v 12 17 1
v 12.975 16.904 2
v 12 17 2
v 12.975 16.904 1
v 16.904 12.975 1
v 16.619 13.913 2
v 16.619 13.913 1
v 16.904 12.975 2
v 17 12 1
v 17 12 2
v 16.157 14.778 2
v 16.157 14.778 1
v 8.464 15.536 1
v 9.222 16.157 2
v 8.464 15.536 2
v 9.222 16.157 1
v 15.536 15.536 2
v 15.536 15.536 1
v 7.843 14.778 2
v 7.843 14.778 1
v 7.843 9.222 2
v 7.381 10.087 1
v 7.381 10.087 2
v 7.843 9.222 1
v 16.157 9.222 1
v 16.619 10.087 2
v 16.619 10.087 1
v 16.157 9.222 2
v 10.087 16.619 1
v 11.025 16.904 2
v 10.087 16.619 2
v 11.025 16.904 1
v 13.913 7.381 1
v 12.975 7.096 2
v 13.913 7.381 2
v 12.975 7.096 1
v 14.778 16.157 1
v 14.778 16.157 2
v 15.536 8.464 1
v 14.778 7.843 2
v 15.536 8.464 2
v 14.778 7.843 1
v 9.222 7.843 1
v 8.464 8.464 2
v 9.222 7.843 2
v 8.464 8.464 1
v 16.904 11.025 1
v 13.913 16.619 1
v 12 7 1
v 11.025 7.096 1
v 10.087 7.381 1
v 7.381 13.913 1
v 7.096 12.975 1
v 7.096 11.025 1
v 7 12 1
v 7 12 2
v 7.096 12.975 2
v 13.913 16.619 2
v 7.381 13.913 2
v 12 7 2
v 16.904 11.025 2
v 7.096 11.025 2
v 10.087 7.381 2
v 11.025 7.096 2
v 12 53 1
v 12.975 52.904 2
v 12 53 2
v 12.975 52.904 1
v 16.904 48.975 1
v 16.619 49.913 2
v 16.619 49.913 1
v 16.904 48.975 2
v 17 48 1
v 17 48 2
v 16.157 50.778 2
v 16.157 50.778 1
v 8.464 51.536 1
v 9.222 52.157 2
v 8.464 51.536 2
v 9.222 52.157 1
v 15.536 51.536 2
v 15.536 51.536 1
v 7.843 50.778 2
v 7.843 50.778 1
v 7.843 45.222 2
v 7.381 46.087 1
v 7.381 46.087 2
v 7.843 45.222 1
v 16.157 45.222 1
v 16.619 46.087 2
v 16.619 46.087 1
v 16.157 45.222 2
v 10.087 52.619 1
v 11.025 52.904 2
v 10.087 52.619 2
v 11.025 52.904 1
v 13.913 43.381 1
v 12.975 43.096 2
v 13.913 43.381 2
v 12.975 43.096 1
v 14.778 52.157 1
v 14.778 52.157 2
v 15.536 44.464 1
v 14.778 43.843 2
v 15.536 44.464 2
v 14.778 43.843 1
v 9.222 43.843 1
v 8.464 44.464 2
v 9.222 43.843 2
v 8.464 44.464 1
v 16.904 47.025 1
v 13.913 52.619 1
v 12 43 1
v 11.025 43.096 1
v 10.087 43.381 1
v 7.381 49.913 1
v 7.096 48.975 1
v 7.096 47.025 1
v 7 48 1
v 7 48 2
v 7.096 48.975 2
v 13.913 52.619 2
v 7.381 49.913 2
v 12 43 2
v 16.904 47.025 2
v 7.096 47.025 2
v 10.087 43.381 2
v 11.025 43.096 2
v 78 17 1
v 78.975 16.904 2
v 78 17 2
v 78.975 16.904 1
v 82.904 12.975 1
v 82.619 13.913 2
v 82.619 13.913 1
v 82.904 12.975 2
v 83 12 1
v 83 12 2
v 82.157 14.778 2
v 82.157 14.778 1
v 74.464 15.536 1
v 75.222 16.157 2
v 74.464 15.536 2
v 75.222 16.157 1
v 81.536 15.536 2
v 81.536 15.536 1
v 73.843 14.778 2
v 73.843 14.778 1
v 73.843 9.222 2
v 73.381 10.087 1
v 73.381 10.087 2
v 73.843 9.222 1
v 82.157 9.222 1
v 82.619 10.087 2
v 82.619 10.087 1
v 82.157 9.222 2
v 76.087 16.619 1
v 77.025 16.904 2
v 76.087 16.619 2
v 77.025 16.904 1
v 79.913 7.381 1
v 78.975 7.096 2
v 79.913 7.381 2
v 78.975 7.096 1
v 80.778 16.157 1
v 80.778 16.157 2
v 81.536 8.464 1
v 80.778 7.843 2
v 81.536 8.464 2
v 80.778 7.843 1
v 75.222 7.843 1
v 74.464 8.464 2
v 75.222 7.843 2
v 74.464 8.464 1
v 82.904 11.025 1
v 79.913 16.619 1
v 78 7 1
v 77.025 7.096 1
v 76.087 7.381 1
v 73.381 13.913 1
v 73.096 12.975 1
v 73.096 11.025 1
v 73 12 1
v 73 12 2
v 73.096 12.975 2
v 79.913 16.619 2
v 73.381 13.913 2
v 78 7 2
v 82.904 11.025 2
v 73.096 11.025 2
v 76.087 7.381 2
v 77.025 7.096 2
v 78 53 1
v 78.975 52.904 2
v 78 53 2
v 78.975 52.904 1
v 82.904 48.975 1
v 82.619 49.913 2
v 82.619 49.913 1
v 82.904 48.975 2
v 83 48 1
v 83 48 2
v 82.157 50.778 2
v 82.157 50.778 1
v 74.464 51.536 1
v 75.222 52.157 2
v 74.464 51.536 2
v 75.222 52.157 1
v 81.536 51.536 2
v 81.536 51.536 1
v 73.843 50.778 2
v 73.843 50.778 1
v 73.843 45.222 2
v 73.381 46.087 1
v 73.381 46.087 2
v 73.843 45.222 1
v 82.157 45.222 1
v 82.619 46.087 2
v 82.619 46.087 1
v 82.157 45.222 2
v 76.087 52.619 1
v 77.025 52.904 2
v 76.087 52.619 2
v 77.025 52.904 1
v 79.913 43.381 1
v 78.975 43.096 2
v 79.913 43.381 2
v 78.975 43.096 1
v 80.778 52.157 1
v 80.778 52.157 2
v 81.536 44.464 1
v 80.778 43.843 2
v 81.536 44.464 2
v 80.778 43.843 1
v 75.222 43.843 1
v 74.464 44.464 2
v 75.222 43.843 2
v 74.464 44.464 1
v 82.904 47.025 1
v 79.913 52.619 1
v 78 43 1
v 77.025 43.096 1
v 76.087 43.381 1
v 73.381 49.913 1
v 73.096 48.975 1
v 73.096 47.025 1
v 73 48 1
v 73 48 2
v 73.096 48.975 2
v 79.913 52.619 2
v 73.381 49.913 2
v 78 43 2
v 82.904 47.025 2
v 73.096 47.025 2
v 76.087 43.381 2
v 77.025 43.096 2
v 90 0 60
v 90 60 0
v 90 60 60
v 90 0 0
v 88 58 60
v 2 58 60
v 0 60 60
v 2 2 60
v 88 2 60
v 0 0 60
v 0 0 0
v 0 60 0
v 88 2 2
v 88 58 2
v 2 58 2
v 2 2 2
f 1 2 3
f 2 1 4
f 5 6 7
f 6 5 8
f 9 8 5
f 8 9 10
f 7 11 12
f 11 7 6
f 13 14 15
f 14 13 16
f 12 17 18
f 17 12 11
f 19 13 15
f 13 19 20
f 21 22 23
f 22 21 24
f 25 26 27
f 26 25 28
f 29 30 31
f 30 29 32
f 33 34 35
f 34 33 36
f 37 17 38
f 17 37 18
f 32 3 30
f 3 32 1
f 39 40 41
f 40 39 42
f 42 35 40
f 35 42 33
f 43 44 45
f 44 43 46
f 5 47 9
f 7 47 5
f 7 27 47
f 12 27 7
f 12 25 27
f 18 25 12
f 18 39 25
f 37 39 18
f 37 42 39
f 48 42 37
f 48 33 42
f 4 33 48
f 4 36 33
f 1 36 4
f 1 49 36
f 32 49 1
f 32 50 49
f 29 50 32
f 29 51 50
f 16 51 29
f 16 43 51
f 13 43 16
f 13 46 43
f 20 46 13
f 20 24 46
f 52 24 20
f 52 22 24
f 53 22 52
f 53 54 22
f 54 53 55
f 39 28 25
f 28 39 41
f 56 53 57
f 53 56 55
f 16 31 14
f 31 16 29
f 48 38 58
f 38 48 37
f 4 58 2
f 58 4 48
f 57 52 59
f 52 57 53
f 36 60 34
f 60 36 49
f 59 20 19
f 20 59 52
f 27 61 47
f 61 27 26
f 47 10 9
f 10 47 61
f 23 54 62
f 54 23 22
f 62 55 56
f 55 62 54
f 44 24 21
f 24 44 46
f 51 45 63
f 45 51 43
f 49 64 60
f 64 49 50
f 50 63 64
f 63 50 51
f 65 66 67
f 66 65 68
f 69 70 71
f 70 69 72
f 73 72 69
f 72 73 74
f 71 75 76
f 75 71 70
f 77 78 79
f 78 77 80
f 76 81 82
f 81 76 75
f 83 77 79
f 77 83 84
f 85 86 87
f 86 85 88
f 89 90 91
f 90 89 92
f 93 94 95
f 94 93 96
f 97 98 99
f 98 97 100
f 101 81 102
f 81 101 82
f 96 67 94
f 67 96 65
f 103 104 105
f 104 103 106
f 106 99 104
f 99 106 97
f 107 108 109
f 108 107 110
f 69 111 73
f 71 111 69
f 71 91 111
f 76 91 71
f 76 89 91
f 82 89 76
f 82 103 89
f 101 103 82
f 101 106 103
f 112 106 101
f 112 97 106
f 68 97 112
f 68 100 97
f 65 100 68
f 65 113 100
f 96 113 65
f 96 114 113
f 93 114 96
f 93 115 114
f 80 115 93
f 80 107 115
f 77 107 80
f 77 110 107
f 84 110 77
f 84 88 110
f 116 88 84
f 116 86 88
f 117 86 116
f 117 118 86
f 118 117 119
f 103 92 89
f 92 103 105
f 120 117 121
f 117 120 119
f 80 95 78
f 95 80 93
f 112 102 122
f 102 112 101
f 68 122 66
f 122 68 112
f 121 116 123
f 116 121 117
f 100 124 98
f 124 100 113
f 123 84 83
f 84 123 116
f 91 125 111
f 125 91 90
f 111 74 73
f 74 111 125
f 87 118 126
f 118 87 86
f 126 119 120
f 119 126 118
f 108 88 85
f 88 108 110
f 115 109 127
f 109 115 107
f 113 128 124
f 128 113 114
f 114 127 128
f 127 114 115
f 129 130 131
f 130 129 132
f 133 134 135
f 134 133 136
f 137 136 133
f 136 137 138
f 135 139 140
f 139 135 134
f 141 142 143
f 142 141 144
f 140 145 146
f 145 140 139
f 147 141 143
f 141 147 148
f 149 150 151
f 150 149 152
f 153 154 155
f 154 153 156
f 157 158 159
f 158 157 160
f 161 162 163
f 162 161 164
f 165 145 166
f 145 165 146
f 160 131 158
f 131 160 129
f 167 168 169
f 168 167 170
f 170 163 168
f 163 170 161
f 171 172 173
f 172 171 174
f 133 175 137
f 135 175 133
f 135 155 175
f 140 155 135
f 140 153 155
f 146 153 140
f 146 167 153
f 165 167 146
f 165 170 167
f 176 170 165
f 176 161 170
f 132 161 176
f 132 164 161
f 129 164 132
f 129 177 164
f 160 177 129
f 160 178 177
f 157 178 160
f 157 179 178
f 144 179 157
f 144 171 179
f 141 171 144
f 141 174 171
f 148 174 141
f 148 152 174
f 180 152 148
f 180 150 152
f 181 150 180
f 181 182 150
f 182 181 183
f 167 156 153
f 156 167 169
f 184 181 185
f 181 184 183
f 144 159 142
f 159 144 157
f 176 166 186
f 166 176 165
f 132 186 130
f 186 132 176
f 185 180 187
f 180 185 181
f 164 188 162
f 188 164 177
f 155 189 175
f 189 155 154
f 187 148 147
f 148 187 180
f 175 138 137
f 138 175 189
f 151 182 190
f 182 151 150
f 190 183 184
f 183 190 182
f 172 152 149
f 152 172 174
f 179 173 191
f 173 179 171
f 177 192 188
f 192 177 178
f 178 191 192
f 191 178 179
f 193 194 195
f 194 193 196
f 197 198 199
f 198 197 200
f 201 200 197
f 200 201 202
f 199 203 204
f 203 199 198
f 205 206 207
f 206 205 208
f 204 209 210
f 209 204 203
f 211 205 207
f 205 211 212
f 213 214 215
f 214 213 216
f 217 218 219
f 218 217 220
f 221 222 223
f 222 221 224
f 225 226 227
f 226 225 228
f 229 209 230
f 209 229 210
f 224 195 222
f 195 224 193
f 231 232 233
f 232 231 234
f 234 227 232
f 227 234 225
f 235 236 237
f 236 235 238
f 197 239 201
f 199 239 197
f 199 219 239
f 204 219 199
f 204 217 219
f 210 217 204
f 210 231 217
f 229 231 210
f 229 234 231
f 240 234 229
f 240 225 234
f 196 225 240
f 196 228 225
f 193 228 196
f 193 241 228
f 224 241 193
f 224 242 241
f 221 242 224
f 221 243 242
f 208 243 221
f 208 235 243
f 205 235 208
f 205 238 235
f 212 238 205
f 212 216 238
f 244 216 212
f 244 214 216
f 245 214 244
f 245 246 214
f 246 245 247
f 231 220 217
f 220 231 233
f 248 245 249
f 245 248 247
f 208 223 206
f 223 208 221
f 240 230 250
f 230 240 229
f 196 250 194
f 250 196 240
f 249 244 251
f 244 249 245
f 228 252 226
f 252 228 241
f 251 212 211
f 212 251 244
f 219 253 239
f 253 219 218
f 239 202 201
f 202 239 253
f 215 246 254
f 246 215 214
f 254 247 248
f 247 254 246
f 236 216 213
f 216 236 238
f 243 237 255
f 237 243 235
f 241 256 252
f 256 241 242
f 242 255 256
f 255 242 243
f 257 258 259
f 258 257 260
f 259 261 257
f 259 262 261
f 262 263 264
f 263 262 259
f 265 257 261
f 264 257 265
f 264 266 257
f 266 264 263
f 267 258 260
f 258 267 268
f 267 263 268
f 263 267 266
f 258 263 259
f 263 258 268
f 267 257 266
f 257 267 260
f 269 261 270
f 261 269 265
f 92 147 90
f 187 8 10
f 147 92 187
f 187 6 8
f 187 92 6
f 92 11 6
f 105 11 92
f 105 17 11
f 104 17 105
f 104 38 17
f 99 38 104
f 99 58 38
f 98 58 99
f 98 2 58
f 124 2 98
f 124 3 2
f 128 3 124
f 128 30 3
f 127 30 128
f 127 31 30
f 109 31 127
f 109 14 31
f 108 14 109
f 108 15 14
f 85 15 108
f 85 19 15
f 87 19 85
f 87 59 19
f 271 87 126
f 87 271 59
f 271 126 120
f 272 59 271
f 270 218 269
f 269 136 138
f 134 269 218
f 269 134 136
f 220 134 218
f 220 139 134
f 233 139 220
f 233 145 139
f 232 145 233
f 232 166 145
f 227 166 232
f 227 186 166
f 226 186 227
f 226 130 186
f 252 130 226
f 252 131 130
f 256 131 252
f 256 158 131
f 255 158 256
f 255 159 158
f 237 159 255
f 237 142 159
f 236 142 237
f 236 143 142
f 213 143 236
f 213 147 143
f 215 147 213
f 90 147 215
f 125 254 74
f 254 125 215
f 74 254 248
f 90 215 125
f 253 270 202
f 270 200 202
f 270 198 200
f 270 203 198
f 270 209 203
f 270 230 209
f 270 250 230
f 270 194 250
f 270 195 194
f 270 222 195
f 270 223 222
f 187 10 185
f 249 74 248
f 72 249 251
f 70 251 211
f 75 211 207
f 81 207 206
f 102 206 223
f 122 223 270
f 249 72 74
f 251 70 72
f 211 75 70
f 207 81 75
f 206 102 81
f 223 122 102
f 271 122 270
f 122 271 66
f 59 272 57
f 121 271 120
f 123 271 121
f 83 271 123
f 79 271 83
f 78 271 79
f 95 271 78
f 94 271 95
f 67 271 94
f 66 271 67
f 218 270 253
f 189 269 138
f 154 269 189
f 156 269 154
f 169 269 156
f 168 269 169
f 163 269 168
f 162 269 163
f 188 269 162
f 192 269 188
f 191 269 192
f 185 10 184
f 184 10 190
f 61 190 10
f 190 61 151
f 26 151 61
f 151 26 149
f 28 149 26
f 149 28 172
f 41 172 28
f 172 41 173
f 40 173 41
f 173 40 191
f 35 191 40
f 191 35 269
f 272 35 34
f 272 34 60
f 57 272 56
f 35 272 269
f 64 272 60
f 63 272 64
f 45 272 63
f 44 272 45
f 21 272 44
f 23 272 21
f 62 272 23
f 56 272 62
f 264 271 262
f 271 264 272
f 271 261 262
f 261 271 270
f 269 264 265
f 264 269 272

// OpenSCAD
$fn = 32;

// ----------------------------------------------------------------------
// Enclosure box: bosses enclosure
// ----------------------------------------------------------------------

// --- parameters (mm) ---
box_l = 90;               // outer length, X
box_w = 60;               // outer width, Y
box_h = 60;               // outer height
wall_t = 2;               // wall thickness
boss_r = 5;               // corner boss radius
hole_r = 1.5;             // boss screw hole radius
boss_in = 12;             // boss inset from the corners

inner_h = box_h - wall_t;  // cavity depth
boss_h = inner_h - 2;  // corner boss height

difference() {
  cube([box_l, box_w, box_h]);
  translate([wall_t, wall_t, wall_t])
    cube([box_l - 2 * wall_t, box_w - 2 * wall_t, box_h]);
  for (sx = [0, 1], sy = [0, 1])
    translate([sx ? box_l - boss_in : boss_in,
               sy ? box_w - boss_in : boss_in, wall_t - 1]) {
      cylinder(r = boss_r, h = boss_h);
      translate([0, 0, boss_h - 4])
        cylinder(r = hole_r, h = 5);
    }
}
